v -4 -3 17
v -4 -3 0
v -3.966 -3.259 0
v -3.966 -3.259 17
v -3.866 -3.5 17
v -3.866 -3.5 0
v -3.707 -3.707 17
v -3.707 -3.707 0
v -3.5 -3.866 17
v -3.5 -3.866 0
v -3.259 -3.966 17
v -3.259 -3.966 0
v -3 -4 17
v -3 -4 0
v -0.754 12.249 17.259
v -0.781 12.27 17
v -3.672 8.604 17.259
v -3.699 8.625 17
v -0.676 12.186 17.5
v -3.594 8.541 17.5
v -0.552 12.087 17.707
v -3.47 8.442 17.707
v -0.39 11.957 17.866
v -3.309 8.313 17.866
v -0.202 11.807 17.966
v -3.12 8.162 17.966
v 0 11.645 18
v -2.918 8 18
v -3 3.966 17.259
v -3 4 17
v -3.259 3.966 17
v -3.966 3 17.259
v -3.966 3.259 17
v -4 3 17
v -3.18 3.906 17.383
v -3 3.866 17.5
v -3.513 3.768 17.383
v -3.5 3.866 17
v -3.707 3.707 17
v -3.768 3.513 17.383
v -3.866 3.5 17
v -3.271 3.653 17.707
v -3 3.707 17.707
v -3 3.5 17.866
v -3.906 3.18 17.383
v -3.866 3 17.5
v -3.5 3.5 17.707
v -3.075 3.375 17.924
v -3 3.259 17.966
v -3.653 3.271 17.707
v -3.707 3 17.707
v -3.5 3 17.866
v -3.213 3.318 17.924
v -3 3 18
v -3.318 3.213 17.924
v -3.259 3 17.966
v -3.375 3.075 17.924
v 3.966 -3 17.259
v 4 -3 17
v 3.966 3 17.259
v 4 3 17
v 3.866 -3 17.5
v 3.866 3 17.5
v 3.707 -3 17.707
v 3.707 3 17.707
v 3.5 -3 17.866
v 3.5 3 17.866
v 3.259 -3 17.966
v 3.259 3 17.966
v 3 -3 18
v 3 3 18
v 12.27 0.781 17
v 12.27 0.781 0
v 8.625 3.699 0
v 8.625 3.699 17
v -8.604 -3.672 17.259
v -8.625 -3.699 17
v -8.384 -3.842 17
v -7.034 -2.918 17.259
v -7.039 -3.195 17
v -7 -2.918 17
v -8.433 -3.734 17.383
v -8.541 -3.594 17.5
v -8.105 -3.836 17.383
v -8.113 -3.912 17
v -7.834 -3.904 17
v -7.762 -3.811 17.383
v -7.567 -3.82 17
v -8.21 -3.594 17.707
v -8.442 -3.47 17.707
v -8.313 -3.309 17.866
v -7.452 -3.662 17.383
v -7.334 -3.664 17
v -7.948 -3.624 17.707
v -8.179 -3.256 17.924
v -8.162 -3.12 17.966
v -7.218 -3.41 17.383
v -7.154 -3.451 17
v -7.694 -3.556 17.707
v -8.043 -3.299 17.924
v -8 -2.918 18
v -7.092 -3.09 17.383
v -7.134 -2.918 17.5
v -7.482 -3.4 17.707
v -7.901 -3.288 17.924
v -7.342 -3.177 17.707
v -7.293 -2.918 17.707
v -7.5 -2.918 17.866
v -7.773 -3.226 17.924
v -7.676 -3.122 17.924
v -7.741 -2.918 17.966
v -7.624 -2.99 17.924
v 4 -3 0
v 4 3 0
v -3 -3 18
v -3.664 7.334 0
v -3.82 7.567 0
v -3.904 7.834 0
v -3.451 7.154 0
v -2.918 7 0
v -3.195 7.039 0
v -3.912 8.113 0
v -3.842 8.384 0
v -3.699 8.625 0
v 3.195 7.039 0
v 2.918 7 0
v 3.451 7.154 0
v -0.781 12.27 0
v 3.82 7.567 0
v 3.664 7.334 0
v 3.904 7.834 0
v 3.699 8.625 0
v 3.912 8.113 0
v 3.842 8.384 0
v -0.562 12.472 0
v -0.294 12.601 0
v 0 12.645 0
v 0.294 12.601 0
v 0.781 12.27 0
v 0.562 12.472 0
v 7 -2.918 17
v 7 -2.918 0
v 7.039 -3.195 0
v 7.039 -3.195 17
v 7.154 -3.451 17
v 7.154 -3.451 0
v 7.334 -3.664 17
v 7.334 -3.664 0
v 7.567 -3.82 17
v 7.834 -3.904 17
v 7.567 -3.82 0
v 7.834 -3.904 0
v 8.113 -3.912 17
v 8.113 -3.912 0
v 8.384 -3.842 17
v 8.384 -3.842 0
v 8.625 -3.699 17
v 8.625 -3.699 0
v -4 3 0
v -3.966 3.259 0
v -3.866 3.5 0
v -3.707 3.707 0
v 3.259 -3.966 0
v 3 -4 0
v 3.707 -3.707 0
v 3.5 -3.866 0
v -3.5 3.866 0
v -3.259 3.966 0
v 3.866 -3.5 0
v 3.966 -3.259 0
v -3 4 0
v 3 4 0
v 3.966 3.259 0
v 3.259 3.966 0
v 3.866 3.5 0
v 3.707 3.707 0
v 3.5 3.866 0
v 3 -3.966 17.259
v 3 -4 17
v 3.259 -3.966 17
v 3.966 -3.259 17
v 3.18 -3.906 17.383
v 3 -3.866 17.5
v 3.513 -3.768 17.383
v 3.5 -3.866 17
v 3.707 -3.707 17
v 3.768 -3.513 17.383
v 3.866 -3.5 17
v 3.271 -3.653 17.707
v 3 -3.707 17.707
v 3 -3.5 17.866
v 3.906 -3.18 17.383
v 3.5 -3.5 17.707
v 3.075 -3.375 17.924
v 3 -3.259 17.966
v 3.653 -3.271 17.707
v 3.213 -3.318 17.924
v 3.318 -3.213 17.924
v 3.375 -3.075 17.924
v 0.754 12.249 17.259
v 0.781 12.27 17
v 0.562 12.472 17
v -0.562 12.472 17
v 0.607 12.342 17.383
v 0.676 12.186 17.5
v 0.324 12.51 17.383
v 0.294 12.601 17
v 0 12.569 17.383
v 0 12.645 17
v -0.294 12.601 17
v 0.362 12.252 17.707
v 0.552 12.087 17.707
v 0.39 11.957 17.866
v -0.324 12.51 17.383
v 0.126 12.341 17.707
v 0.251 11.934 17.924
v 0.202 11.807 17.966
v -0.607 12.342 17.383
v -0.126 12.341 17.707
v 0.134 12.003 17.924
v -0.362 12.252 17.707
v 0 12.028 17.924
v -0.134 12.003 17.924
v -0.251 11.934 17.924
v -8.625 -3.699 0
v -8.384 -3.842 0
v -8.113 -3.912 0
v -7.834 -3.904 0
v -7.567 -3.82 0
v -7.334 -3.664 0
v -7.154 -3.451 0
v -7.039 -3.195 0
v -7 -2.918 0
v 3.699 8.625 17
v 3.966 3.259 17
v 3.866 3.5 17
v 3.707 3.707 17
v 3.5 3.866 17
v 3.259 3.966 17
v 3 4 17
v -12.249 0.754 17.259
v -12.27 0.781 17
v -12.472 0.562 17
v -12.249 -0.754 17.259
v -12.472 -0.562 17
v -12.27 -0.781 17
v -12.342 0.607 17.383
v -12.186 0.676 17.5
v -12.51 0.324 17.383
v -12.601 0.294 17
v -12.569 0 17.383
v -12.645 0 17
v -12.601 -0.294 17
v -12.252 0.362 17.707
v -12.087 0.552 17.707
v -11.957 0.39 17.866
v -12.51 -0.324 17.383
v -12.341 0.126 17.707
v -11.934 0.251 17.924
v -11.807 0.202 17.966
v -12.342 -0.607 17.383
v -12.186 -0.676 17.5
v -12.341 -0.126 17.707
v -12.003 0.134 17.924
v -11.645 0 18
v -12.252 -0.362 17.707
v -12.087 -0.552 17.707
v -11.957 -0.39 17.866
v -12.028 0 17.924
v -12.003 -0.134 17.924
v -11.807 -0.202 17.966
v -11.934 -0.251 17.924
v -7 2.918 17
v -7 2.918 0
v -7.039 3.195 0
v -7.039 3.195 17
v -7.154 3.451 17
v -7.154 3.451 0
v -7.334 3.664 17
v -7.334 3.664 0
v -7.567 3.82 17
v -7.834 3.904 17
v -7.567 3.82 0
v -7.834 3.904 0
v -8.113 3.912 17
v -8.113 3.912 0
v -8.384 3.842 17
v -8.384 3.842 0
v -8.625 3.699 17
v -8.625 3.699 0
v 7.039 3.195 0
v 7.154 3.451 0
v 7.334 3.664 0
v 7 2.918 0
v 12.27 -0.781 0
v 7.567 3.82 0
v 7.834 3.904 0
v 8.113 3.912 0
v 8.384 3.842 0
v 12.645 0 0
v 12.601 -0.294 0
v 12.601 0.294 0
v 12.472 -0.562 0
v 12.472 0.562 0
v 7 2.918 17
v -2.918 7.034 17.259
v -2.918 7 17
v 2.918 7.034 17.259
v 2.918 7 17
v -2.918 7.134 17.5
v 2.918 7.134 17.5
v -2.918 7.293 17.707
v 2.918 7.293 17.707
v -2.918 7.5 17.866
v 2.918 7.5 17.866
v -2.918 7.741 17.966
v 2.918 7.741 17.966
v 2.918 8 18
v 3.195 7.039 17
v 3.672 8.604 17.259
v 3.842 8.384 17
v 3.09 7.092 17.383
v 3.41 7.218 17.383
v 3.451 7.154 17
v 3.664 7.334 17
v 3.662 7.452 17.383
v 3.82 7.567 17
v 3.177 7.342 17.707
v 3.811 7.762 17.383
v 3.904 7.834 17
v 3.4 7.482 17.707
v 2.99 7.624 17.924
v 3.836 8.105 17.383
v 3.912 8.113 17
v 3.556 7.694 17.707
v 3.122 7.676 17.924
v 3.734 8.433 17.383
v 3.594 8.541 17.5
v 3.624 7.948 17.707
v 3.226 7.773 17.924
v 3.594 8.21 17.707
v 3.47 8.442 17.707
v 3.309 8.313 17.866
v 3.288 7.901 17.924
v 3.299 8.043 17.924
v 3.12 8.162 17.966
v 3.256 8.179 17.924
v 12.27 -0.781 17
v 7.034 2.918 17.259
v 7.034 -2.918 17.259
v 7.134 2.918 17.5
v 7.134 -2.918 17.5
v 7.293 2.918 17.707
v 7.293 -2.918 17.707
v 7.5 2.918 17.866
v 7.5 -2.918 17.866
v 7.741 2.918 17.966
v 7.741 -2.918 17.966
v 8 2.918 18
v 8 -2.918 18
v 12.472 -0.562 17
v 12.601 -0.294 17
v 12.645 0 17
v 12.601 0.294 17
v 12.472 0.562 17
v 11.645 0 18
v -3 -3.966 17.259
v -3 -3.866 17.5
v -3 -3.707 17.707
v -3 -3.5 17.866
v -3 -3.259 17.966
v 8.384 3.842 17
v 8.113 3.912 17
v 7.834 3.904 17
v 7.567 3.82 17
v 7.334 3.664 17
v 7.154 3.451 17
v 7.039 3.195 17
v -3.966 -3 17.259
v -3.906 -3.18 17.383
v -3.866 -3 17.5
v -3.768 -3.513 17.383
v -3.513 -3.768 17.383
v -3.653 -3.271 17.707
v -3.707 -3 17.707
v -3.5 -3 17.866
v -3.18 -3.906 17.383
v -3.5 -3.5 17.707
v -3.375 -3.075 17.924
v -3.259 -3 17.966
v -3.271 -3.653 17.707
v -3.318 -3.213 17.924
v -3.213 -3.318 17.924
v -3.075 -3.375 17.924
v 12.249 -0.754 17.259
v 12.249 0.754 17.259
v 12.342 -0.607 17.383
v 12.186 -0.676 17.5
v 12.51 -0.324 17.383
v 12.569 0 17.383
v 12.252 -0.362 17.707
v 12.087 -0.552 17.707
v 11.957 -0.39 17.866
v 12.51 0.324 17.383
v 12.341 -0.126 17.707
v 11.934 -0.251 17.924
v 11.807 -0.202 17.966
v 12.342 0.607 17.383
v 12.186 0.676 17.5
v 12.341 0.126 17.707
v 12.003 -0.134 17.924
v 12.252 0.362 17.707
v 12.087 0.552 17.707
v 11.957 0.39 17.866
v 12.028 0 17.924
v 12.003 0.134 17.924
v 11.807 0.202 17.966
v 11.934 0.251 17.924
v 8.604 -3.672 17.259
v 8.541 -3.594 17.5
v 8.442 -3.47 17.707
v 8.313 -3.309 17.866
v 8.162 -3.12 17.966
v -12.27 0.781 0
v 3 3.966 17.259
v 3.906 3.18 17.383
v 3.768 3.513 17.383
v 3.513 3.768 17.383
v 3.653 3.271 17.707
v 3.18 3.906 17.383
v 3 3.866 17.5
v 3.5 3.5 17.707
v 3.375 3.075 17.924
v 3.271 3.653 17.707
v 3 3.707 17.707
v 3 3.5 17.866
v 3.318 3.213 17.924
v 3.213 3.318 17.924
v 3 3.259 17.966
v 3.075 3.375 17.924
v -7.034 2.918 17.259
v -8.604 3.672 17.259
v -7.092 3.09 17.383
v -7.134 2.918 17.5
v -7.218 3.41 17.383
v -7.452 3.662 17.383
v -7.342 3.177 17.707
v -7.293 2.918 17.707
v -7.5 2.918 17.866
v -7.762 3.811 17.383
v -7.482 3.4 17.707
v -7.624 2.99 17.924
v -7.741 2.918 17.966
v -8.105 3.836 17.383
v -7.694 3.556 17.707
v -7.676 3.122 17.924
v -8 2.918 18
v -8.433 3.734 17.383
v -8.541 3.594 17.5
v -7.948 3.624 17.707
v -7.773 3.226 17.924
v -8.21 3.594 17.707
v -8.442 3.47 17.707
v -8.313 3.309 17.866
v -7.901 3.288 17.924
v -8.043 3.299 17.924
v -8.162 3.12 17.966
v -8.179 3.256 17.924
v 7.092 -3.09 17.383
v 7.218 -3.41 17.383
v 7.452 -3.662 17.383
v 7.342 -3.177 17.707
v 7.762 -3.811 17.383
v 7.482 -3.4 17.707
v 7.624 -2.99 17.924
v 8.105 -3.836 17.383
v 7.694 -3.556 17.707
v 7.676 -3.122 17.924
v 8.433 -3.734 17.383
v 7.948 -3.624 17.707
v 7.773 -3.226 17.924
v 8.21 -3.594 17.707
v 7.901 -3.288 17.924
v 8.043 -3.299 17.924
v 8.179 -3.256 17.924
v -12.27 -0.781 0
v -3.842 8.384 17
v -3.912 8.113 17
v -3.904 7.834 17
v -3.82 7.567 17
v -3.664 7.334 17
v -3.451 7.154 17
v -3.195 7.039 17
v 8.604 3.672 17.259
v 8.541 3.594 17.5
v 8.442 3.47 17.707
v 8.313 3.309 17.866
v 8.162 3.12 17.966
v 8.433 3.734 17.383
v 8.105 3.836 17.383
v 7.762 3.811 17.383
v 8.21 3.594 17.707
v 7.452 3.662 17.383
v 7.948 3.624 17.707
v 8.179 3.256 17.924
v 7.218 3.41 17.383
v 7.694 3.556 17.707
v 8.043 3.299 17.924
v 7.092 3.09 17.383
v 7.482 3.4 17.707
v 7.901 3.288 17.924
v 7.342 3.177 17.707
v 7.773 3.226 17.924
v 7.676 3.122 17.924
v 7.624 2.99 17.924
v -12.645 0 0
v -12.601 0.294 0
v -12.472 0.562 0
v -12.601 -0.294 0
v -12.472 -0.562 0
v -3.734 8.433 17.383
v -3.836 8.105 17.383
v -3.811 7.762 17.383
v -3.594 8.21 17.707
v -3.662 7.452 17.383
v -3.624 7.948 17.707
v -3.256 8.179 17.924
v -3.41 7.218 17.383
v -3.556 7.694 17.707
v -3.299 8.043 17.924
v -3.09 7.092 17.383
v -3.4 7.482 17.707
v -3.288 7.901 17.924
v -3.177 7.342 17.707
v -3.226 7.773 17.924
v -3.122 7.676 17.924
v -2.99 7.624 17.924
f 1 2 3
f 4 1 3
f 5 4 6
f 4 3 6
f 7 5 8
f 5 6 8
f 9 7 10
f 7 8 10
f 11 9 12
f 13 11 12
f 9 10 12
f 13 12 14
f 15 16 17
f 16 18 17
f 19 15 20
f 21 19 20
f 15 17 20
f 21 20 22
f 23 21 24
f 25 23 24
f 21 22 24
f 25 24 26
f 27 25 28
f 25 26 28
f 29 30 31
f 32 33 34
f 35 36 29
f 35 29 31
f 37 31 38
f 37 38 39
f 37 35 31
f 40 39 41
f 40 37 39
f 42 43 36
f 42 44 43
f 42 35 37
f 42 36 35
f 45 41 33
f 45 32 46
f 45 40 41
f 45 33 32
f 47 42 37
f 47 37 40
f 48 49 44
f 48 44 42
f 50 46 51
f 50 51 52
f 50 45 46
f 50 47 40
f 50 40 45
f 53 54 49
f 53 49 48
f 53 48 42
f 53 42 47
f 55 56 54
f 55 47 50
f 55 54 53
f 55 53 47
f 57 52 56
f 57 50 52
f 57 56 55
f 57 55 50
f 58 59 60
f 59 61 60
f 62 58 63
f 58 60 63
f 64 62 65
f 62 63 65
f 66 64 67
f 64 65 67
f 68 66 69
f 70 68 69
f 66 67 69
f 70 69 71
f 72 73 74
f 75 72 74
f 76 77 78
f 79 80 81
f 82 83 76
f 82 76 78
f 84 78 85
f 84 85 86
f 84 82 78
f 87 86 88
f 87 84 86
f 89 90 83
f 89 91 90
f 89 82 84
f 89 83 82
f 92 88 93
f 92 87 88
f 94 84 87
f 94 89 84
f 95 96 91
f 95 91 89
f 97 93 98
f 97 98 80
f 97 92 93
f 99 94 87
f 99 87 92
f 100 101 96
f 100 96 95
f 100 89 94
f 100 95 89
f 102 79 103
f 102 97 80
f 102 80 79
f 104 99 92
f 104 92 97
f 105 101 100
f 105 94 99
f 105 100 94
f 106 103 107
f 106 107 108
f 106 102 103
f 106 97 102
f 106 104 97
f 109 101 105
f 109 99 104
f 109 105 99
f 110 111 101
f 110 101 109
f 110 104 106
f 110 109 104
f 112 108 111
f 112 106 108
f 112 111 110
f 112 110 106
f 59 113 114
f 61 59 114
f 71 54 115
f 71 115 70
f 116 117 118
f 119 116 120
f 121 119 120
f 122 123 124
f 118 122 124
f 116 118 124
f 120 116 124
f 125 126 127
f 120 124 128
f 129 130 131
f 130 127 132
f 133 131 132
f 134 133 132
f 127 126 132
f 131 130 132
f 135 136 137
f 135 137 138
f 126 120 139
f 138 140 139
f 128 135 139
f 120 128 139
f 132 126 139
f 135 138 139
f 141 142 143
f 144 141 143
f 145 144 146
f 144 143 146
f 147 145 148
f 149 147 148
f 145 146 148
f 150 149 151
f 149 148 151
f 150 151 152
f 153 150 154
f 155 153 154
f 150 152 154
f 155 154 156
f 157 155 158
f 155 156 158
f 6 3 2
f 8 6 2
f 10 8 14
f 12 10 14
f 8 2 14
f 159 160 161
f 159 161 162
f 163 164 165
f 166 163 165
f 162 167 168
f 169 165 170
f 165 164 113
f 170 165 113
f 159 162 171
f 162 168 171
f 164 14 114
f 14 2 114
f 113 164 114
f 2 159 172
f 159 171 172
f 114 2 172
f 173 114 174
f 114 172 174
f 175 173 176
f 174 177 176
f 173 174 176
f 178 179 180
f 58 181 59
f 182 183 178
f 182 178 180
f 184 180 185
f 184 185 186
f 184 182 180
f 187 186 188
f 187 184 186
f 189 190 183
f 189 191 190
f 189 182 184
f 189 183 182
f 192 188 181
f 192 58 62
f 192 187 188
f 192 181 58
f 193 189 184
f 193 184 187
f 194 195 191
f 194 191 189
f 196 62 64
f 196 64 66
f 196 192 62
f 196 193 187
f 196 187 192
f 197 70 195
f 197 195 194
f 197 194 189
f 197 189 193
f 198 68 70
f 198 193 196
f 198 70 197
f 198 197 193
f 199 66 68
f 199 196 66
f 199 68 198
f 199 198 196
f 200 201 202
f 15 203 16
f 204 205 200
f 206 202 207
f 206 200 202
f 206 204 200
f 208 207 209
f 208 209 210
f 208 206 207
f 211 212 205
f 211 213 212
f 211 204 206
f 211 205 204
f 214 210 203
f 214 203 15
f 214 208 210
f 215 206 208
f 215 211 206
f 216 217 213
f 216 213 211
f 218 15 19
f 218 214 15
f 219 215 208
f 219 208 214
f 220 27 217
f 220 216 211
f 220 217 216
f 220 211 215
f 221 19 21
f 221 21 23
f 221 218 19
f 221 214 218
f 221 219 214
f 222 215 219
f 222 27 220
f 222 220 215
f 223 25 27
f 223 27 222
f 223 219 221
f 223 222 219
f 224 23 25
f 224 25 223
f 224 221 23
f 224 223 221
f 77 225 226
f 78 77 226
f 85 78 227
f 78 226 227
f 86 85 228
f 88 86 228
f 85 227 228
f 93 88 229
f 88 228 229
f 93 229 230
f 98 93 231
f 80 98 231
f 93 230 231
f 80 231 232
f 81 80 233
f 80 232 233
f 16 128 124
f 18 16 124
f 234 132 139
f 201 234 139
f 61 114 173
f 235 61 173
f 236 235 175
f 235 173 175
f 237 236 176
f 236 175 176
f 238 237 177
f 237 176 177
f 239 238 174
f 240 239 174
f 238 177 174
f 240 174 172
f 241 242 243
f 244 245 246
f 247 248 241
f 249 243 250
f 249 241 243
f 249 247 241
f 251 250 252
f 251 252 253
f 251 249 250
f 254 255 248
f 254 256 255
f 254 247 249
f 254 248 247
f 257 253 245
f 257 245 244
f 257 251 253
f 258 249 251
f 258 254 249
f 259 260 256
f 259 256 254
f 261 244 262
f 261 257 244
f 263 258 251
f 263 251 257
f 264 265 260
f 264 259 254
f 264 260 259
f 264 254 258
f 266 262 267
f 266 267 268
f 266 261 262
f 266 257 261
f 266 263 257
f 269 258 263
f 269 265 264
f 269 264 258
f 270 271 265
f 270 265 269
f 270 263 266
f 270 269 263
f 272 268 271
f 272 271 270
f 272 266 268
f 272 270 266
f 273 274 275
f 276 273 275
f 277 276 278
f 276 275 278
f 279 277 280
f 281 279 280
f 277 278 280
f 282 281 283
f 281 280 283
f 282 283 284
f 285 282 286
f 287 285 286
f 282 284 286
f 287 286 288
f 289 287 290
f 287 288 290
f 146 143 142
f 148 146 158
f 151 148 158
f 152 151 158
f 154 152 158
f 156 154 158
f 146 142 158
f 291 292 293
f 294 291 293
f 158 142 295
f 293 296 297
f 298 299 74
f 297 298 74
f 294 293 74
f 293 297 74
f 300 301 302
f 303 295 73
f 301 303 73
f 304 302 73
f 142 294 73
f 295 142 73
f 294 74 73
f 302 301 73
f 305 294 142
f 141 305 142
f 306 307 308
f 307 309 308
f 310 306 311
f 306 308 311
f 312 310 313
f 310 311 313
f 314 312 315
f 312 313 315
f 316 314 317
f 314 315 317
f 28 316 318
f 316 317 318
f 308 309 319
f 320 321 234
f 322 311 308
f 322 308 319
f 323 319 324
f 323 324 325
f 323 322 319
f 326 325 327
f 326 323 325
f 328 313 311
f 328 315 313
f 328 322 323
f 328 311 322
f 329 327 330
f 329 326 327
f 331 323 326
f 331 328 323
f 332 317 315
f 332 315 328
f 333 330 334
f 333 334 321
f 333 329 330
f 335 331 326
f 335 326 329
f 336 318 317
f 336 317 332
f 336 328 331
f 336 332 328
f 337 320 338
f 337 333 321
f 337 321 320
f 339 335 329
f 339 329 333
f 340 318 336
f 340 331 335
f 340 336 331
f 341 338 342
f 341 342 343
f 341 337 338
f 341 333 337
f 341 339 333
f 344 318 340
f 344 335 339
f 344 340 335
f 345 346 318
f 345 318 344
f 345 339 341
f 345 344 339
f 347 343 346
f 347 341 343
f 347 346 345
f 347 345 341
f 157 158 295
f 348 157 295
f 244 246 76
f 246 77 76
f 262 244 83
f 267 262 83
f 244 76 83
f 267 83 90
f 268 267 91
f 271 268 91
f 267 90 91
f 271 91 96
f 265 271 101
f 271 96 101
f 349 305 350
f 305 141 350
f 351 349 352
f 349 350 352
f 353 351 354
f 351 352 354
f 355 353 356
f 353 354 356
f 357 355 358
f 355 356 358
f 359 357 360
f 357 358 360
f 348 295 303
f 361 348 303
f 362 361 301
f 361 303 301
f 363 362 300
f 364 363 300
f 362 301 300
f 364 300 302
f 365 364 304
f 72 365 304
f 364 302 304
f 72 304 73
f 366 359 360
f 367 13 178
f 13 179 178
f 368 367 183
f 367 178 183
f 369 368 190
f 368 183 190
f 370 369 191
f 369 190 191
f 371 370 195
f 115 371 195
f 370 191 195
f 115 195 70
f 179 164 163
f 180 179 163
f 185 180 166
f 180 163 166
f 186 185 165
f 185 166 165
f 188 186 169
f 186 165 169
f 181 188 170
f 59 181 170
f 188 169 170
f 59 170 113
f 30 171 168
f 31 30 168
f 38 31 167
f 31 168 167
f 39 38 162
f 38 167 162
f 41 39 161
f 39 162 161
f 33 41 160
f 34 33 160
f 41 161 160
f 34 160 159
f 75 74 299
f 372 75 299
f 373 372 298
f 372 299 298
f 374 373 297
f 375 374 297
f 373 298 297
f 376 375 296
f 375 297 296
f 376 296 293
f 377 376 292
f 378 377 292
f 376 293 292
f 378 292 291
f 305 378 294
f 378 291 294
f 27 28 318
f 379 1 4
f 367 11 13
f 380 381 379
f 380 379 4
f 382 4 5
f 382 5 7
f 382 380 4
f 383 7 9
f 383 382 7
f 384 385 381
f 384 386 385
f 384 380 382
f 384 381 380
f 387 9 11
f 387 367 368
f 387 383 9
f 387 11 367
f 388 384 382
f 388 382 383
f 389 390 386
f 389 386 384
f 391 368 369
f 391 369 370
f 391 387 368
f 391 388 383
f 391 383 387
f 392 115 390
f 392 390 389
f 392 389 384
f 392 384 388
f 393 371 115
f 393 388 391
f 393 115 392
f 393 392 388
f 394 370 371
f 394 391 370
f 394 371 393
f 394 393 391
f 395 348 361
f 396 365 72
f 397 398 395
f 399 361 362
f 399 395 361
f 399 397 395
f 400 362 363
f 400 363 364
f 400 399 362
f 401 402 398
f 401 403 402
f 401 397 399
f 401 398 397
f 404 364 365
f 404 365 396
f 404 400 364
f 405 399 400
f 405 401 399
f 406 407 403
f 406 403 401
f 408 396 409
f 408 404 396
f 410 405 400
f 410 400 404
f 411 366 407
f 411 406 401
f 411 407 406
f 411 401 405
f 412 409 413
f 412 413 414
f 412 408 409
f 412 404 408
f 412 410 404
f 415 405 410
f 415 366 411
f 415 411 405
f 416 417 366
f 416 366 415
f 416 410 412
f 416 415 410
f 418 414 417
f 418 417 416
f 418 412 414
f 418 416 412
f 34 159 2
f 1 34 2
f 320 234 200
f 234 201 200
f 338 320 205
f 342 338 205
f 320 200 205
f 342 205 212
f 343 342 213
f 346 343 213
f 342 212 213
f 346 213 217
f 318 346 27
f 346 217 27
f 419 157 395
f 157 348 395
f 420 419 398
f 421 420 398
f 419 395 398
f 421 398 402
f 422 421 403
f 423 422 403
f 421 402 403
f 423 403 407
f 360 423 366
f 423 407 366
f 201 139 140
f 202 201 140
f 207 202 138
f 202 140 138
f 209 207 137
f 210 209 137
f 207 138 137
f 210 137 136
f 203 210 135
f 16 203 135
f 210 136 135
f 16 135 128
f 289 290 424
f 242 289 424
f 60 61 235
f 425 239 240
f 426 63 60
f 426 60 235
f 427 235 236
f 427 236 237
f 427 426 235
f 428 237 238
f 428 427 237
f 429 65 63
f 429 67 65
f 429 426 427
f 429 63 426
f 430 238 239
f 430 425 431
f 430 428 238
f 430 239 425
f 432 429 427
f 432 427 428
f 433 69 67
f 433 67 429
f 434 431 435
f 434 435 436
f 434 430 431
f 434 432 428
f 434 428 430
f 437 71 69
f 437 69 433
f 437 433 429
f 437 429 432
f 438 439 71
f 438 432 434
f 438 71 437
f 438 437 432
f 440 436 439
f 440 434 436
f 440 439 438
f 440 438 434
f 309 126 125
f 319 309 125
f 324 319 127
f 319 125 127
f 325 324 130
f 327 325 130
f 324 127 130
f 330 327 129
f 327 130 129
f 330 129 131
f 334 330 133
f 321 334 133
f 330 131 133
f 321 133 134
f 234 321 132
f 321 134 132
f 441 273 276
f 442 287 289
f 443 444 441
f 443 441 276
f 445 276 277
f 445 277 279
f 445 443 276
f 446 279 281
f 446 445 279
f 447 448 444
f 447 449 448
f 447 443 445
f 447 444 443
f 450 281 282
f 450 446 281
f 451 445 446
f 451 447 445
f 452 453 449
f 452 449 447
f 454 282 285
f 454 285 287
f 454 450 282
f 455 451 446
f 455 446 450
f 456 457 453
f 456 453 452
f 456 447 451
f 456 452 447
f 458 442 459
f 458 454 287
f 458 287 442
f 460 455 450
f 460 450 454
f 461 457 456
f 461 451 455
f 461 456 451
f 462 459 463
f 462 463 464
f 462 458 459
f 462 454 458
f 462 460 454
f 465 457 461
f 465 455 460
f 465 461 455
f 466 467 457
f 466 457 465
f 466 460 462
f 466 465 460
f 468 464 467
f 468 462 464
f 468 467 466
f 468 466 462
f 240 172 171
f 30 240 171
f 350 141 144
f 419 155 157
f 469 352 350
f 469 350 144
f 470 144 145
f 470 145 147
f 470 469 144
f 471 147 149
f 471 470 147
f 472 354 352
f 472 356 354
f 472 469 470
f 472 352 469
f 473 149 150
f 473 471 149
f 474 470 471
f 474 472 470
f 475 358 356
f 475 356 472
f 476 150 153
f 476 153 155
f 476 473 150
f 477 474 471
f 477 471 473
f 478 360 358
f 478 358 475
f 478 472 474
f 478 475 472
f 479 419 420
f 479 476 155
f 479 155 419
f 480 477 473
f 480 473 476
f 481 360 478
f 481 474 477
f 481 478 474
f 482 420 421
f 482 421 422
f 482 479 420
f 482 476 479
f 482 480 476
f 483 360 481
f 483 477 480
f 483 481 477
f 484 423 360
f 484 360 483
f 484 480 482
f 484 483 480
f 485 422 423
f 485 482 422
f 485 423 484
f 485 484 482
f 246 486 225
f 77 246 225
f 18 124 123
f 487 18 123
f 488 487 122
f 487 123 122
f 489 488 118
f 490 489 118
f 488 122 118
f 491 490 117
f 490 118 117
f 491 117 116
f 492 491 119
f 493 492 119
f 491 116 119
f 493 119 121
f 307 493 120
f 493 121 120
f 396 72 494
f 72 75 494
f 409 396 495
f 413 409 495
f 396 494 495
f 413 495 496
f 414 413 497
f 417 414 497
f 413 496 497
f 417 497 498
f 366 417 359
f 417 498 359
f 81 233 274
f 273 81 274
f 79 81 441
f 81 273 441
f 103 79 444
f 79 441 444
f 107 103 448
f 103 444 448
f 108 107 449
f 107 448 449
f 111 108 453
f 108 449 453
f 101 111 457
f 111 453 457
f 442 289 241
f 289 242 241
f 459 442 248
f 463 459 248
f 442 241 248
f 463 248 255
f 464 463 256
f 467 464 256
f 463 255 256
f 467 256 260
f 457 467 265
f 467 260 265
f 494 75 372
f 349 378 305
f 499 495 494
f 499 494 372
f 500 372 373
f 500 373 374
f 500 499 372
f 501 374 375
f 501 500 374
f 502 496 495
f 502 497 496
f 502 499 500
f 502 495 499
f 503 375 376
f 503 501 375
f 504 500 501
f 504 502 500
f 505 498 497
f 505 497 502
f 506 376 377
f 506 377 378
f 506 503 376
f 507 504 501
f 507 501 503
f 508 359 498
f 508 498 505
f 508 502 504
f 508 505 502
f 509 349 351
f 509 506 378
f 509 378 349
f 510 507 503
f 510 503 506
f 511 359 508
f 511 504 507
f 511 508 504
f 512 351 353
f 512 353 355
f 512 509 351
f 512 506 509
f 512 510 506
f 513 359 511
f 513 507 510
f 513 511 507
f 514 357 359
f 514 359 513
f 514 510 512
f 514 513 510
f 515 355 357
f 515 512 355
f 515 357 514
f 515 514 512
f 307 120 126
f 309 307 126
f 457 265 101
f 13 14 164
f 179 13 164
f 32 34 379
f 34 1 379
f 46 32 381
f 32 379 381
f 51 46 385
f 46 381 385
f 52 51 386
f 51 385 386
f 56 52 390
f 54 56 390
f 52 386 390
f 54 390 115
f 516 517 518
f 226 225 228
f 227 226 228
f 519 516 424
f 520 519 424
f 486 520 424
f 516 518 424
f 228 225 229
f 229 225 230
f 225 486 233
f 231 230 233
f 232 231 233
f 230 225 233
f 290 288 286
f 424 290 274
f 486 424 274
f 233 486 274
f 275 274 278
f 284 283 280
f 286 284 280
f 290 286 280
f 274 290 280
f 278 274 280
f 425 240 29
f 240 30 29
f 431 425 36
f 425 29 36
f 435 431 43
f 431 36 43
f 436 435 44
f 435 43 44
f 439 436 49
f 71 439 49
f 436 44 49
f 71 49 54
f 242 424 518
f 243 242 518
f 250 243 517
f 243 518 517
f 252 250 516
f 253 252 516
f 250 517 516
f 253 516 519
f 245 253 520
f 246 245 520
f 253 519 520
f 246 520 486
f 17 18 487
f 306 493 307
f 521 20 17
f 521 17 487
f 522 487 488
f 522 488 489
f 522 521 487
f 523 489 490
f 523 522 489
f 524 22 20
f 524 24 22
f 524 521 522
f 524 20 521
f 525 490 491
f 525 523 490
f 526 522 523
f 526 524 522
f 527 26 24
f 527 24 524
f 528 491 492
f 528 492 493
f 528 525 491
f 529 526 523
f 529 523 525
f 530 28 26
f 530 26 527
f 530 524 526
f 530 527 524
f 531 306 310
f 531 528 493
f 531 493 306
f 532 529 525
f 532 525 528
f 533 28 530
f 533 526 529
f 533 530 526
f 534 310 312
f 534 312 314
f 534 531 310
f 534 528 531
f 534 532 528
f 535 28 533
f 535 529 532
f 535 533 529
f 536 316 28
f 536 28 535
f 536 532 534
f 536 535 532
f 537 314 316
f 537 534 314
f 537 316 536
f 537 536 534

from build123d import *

# Parameters (mm, degrees)
BOSS_EXTRUDE1_DEPTH   = 18
BOSS_EXTRUDE1_2_DEPTH = 18
BOSS_EXTRUDE1_3_DEPTH = 18
BOSS_EXTRUDE1_4_DEPTH = 18
FILLET1_R             = 1
FILLET2_R             = 1
FILLET3_R             = 1
FILLET4_R             = 1


with BuildPart() as part:
    # Sketch1 → Boss-Extrude1 (new body)
    with BuildSketch(Plane.XY):
        with BuildLine():
            Line((-0.78062475, 12.269997998), (-3.69895875, 8.625))
            ThreePointArc((-3.69895875, 8.625), (-3.819721819, 7.566987298), (-2.918334001, 7))
            Line((-2.918334001, 7), (2.918334001, 7))
            ThreePointArc((2.918334001, 7), (3.819721819, 7.566987298), (3.69895875, 8.625))
            Line((3.69895875, 8.625), (0.78062475, 12.269997998))
            ThreePointArc((0.78062475, 12.269997998), (0, 12.644997998), (-0.78062475, 12.269997998))
        make_face()
    extrude(amount=BOSS_EXTRUDE1_DEPTH)

    # Fillet1
    fillet1_edges = [part.edges().sort_by_distance(p)[0] for p in [
        (0, 12.644997998, 18),
        (-2.23979175, 10.447498999, 18),
        (-3.819721819, 7.566987298, 18),
        (0, 7, 18),
        (3.819721819, 7.566987298, 18),
        (2.23979175, 10.447498999, 18),
    ]]
    fillet(fillet1_edges, radius=FILLET1_R)


with BuildPart() as body_2:
    # Sketch1 → Boss-Extrude1 2 (new body)
    with BuildSketch(Plane.XY):
        with BuildLine():
            Line((8.625, -3.69895875), (12.269997998, -0.78062475))
            ThreePointArc((12.269997998, -0.78062475), (12.644997998, 0), (12.269997998, 0.78062475))
            Line((12.269997998, 0.78062475), (8.625, 3.69895875))
            ThreePointArc((8.625, 3.69895875), (7.566987298, 3.819721819), (7, 2.918334001))
            Line((7, 2.918334001), (7, -2.918334001))
            ThreePointArc((7, -2.918334001), (7.566987298, -3.819721819), (8.625, -3.69895875))
        make_face()
    extrude(amount=BOSS_EXTRUDE1_2_DEPTH)

    # Fillet4
    fillet4_edges = [body_2.edges().sort_by_distance(p)[0] for p in [
        (12.644997998, 0, 18),
        (10.447498999, 2.23979175, 18),
        (7.566987298, 3.819721819, 18),
        (7, 0, 18),
        (7.566987298, -3.819721819, 18),
        (10.447498999, -2.23979175, 18),
    ]]
    fillet(fillet4_edges, radius=FILLET4_R)


with BuildPart() as body_3:
    # Sketch1 → Boss-Extrude1 3 (new body)
    with BuildSketch(Plane.XY):
        with BuildLine():
            Line((-3, -4), (3, -4))
            ThreePointArc((3, -4), (3.707106781, -3.707106781), (4, -3))
            Line((4, -3), (4, 3))
            ThreePointArc((4, 3), (3.707106781, 3.707106781), (3, 4))
            Line((3, 4), (-3, 4))
            ThreePointArc((-3, 4), (-3.707106781, 3.707106781), (-4, 3))
            Line((-4, 3), (-4, -3))
            ThreePointArc((-4, -3), (-3.707106781, -3.707106781), (-3, -4))
        make_face()
    extrude(amount=BOSS_EXTRUDE1_3_DEPTH)

    # Fillet3
    fillet3_edges = [body_3.edges().sort_by_distance(p)[0] for p in [
        (3.707106781, -3.707106781, 18),
        (4, 0, 18),
        (3.707106781, 3.707106781, 18),
        (0, 4, 18),
        (-3.707106781, 3.707106781, 18),
        (-4, 0, 18),
        (-3.707106781, -3.707106781, 18),
        (0, -4, 18),
    ]]
    fillet(fillet3_edges, radius=FILLET3_R)


with BuildPart() as body_4:
    # Sketch1 → Boss-Extrude1 4 (new body)
    with BuildSketch(Plane.XY):
        with BuildLine():
            Line((-8.625, 3.69895875), (-12.269997998, 0.78062475))
            ThreePointArc((-12.269997998, 0.78062475), (-12.644997998, 0), (-12.269997998, -0.78062475))
            Line((-12.269997998, -0.78062475), (-8.625, -3.69895875))
            ThreePointArc((-8.625, -3.69895875), (-7.566987298, -3.819721819), (-7, -2.918334001))
            Line((-7, -2.918334001), (-7, 2.918334001))
            ThreePointArc((-7, 2.918334001), (-7.566987298, 3.819721819), (-8.625, 3.69895875))
        make_face()
    extrude(amount=BOSS_EXTRUDE1_4_DEPTH)

    # Fillet2
    fillet2_edges = [body_4.edges().sort_by_distance(p)[0] for p in [
        (-7.566987298, 3.819721819, 18),
        (-10.447498999, 2.23979175, 18),
        (-12.644997998, 0, 18),
        (-10.447498999, -2.23979175, 18),
        (-7.566987298, -3.819721819, 18),
        (-7, 0, 18),
    ]]
    fillet(fillet2_edges, radius=FILLET2_R)


solid = Compound([part.part, body_2.part, body_3.part, body_4.part])
